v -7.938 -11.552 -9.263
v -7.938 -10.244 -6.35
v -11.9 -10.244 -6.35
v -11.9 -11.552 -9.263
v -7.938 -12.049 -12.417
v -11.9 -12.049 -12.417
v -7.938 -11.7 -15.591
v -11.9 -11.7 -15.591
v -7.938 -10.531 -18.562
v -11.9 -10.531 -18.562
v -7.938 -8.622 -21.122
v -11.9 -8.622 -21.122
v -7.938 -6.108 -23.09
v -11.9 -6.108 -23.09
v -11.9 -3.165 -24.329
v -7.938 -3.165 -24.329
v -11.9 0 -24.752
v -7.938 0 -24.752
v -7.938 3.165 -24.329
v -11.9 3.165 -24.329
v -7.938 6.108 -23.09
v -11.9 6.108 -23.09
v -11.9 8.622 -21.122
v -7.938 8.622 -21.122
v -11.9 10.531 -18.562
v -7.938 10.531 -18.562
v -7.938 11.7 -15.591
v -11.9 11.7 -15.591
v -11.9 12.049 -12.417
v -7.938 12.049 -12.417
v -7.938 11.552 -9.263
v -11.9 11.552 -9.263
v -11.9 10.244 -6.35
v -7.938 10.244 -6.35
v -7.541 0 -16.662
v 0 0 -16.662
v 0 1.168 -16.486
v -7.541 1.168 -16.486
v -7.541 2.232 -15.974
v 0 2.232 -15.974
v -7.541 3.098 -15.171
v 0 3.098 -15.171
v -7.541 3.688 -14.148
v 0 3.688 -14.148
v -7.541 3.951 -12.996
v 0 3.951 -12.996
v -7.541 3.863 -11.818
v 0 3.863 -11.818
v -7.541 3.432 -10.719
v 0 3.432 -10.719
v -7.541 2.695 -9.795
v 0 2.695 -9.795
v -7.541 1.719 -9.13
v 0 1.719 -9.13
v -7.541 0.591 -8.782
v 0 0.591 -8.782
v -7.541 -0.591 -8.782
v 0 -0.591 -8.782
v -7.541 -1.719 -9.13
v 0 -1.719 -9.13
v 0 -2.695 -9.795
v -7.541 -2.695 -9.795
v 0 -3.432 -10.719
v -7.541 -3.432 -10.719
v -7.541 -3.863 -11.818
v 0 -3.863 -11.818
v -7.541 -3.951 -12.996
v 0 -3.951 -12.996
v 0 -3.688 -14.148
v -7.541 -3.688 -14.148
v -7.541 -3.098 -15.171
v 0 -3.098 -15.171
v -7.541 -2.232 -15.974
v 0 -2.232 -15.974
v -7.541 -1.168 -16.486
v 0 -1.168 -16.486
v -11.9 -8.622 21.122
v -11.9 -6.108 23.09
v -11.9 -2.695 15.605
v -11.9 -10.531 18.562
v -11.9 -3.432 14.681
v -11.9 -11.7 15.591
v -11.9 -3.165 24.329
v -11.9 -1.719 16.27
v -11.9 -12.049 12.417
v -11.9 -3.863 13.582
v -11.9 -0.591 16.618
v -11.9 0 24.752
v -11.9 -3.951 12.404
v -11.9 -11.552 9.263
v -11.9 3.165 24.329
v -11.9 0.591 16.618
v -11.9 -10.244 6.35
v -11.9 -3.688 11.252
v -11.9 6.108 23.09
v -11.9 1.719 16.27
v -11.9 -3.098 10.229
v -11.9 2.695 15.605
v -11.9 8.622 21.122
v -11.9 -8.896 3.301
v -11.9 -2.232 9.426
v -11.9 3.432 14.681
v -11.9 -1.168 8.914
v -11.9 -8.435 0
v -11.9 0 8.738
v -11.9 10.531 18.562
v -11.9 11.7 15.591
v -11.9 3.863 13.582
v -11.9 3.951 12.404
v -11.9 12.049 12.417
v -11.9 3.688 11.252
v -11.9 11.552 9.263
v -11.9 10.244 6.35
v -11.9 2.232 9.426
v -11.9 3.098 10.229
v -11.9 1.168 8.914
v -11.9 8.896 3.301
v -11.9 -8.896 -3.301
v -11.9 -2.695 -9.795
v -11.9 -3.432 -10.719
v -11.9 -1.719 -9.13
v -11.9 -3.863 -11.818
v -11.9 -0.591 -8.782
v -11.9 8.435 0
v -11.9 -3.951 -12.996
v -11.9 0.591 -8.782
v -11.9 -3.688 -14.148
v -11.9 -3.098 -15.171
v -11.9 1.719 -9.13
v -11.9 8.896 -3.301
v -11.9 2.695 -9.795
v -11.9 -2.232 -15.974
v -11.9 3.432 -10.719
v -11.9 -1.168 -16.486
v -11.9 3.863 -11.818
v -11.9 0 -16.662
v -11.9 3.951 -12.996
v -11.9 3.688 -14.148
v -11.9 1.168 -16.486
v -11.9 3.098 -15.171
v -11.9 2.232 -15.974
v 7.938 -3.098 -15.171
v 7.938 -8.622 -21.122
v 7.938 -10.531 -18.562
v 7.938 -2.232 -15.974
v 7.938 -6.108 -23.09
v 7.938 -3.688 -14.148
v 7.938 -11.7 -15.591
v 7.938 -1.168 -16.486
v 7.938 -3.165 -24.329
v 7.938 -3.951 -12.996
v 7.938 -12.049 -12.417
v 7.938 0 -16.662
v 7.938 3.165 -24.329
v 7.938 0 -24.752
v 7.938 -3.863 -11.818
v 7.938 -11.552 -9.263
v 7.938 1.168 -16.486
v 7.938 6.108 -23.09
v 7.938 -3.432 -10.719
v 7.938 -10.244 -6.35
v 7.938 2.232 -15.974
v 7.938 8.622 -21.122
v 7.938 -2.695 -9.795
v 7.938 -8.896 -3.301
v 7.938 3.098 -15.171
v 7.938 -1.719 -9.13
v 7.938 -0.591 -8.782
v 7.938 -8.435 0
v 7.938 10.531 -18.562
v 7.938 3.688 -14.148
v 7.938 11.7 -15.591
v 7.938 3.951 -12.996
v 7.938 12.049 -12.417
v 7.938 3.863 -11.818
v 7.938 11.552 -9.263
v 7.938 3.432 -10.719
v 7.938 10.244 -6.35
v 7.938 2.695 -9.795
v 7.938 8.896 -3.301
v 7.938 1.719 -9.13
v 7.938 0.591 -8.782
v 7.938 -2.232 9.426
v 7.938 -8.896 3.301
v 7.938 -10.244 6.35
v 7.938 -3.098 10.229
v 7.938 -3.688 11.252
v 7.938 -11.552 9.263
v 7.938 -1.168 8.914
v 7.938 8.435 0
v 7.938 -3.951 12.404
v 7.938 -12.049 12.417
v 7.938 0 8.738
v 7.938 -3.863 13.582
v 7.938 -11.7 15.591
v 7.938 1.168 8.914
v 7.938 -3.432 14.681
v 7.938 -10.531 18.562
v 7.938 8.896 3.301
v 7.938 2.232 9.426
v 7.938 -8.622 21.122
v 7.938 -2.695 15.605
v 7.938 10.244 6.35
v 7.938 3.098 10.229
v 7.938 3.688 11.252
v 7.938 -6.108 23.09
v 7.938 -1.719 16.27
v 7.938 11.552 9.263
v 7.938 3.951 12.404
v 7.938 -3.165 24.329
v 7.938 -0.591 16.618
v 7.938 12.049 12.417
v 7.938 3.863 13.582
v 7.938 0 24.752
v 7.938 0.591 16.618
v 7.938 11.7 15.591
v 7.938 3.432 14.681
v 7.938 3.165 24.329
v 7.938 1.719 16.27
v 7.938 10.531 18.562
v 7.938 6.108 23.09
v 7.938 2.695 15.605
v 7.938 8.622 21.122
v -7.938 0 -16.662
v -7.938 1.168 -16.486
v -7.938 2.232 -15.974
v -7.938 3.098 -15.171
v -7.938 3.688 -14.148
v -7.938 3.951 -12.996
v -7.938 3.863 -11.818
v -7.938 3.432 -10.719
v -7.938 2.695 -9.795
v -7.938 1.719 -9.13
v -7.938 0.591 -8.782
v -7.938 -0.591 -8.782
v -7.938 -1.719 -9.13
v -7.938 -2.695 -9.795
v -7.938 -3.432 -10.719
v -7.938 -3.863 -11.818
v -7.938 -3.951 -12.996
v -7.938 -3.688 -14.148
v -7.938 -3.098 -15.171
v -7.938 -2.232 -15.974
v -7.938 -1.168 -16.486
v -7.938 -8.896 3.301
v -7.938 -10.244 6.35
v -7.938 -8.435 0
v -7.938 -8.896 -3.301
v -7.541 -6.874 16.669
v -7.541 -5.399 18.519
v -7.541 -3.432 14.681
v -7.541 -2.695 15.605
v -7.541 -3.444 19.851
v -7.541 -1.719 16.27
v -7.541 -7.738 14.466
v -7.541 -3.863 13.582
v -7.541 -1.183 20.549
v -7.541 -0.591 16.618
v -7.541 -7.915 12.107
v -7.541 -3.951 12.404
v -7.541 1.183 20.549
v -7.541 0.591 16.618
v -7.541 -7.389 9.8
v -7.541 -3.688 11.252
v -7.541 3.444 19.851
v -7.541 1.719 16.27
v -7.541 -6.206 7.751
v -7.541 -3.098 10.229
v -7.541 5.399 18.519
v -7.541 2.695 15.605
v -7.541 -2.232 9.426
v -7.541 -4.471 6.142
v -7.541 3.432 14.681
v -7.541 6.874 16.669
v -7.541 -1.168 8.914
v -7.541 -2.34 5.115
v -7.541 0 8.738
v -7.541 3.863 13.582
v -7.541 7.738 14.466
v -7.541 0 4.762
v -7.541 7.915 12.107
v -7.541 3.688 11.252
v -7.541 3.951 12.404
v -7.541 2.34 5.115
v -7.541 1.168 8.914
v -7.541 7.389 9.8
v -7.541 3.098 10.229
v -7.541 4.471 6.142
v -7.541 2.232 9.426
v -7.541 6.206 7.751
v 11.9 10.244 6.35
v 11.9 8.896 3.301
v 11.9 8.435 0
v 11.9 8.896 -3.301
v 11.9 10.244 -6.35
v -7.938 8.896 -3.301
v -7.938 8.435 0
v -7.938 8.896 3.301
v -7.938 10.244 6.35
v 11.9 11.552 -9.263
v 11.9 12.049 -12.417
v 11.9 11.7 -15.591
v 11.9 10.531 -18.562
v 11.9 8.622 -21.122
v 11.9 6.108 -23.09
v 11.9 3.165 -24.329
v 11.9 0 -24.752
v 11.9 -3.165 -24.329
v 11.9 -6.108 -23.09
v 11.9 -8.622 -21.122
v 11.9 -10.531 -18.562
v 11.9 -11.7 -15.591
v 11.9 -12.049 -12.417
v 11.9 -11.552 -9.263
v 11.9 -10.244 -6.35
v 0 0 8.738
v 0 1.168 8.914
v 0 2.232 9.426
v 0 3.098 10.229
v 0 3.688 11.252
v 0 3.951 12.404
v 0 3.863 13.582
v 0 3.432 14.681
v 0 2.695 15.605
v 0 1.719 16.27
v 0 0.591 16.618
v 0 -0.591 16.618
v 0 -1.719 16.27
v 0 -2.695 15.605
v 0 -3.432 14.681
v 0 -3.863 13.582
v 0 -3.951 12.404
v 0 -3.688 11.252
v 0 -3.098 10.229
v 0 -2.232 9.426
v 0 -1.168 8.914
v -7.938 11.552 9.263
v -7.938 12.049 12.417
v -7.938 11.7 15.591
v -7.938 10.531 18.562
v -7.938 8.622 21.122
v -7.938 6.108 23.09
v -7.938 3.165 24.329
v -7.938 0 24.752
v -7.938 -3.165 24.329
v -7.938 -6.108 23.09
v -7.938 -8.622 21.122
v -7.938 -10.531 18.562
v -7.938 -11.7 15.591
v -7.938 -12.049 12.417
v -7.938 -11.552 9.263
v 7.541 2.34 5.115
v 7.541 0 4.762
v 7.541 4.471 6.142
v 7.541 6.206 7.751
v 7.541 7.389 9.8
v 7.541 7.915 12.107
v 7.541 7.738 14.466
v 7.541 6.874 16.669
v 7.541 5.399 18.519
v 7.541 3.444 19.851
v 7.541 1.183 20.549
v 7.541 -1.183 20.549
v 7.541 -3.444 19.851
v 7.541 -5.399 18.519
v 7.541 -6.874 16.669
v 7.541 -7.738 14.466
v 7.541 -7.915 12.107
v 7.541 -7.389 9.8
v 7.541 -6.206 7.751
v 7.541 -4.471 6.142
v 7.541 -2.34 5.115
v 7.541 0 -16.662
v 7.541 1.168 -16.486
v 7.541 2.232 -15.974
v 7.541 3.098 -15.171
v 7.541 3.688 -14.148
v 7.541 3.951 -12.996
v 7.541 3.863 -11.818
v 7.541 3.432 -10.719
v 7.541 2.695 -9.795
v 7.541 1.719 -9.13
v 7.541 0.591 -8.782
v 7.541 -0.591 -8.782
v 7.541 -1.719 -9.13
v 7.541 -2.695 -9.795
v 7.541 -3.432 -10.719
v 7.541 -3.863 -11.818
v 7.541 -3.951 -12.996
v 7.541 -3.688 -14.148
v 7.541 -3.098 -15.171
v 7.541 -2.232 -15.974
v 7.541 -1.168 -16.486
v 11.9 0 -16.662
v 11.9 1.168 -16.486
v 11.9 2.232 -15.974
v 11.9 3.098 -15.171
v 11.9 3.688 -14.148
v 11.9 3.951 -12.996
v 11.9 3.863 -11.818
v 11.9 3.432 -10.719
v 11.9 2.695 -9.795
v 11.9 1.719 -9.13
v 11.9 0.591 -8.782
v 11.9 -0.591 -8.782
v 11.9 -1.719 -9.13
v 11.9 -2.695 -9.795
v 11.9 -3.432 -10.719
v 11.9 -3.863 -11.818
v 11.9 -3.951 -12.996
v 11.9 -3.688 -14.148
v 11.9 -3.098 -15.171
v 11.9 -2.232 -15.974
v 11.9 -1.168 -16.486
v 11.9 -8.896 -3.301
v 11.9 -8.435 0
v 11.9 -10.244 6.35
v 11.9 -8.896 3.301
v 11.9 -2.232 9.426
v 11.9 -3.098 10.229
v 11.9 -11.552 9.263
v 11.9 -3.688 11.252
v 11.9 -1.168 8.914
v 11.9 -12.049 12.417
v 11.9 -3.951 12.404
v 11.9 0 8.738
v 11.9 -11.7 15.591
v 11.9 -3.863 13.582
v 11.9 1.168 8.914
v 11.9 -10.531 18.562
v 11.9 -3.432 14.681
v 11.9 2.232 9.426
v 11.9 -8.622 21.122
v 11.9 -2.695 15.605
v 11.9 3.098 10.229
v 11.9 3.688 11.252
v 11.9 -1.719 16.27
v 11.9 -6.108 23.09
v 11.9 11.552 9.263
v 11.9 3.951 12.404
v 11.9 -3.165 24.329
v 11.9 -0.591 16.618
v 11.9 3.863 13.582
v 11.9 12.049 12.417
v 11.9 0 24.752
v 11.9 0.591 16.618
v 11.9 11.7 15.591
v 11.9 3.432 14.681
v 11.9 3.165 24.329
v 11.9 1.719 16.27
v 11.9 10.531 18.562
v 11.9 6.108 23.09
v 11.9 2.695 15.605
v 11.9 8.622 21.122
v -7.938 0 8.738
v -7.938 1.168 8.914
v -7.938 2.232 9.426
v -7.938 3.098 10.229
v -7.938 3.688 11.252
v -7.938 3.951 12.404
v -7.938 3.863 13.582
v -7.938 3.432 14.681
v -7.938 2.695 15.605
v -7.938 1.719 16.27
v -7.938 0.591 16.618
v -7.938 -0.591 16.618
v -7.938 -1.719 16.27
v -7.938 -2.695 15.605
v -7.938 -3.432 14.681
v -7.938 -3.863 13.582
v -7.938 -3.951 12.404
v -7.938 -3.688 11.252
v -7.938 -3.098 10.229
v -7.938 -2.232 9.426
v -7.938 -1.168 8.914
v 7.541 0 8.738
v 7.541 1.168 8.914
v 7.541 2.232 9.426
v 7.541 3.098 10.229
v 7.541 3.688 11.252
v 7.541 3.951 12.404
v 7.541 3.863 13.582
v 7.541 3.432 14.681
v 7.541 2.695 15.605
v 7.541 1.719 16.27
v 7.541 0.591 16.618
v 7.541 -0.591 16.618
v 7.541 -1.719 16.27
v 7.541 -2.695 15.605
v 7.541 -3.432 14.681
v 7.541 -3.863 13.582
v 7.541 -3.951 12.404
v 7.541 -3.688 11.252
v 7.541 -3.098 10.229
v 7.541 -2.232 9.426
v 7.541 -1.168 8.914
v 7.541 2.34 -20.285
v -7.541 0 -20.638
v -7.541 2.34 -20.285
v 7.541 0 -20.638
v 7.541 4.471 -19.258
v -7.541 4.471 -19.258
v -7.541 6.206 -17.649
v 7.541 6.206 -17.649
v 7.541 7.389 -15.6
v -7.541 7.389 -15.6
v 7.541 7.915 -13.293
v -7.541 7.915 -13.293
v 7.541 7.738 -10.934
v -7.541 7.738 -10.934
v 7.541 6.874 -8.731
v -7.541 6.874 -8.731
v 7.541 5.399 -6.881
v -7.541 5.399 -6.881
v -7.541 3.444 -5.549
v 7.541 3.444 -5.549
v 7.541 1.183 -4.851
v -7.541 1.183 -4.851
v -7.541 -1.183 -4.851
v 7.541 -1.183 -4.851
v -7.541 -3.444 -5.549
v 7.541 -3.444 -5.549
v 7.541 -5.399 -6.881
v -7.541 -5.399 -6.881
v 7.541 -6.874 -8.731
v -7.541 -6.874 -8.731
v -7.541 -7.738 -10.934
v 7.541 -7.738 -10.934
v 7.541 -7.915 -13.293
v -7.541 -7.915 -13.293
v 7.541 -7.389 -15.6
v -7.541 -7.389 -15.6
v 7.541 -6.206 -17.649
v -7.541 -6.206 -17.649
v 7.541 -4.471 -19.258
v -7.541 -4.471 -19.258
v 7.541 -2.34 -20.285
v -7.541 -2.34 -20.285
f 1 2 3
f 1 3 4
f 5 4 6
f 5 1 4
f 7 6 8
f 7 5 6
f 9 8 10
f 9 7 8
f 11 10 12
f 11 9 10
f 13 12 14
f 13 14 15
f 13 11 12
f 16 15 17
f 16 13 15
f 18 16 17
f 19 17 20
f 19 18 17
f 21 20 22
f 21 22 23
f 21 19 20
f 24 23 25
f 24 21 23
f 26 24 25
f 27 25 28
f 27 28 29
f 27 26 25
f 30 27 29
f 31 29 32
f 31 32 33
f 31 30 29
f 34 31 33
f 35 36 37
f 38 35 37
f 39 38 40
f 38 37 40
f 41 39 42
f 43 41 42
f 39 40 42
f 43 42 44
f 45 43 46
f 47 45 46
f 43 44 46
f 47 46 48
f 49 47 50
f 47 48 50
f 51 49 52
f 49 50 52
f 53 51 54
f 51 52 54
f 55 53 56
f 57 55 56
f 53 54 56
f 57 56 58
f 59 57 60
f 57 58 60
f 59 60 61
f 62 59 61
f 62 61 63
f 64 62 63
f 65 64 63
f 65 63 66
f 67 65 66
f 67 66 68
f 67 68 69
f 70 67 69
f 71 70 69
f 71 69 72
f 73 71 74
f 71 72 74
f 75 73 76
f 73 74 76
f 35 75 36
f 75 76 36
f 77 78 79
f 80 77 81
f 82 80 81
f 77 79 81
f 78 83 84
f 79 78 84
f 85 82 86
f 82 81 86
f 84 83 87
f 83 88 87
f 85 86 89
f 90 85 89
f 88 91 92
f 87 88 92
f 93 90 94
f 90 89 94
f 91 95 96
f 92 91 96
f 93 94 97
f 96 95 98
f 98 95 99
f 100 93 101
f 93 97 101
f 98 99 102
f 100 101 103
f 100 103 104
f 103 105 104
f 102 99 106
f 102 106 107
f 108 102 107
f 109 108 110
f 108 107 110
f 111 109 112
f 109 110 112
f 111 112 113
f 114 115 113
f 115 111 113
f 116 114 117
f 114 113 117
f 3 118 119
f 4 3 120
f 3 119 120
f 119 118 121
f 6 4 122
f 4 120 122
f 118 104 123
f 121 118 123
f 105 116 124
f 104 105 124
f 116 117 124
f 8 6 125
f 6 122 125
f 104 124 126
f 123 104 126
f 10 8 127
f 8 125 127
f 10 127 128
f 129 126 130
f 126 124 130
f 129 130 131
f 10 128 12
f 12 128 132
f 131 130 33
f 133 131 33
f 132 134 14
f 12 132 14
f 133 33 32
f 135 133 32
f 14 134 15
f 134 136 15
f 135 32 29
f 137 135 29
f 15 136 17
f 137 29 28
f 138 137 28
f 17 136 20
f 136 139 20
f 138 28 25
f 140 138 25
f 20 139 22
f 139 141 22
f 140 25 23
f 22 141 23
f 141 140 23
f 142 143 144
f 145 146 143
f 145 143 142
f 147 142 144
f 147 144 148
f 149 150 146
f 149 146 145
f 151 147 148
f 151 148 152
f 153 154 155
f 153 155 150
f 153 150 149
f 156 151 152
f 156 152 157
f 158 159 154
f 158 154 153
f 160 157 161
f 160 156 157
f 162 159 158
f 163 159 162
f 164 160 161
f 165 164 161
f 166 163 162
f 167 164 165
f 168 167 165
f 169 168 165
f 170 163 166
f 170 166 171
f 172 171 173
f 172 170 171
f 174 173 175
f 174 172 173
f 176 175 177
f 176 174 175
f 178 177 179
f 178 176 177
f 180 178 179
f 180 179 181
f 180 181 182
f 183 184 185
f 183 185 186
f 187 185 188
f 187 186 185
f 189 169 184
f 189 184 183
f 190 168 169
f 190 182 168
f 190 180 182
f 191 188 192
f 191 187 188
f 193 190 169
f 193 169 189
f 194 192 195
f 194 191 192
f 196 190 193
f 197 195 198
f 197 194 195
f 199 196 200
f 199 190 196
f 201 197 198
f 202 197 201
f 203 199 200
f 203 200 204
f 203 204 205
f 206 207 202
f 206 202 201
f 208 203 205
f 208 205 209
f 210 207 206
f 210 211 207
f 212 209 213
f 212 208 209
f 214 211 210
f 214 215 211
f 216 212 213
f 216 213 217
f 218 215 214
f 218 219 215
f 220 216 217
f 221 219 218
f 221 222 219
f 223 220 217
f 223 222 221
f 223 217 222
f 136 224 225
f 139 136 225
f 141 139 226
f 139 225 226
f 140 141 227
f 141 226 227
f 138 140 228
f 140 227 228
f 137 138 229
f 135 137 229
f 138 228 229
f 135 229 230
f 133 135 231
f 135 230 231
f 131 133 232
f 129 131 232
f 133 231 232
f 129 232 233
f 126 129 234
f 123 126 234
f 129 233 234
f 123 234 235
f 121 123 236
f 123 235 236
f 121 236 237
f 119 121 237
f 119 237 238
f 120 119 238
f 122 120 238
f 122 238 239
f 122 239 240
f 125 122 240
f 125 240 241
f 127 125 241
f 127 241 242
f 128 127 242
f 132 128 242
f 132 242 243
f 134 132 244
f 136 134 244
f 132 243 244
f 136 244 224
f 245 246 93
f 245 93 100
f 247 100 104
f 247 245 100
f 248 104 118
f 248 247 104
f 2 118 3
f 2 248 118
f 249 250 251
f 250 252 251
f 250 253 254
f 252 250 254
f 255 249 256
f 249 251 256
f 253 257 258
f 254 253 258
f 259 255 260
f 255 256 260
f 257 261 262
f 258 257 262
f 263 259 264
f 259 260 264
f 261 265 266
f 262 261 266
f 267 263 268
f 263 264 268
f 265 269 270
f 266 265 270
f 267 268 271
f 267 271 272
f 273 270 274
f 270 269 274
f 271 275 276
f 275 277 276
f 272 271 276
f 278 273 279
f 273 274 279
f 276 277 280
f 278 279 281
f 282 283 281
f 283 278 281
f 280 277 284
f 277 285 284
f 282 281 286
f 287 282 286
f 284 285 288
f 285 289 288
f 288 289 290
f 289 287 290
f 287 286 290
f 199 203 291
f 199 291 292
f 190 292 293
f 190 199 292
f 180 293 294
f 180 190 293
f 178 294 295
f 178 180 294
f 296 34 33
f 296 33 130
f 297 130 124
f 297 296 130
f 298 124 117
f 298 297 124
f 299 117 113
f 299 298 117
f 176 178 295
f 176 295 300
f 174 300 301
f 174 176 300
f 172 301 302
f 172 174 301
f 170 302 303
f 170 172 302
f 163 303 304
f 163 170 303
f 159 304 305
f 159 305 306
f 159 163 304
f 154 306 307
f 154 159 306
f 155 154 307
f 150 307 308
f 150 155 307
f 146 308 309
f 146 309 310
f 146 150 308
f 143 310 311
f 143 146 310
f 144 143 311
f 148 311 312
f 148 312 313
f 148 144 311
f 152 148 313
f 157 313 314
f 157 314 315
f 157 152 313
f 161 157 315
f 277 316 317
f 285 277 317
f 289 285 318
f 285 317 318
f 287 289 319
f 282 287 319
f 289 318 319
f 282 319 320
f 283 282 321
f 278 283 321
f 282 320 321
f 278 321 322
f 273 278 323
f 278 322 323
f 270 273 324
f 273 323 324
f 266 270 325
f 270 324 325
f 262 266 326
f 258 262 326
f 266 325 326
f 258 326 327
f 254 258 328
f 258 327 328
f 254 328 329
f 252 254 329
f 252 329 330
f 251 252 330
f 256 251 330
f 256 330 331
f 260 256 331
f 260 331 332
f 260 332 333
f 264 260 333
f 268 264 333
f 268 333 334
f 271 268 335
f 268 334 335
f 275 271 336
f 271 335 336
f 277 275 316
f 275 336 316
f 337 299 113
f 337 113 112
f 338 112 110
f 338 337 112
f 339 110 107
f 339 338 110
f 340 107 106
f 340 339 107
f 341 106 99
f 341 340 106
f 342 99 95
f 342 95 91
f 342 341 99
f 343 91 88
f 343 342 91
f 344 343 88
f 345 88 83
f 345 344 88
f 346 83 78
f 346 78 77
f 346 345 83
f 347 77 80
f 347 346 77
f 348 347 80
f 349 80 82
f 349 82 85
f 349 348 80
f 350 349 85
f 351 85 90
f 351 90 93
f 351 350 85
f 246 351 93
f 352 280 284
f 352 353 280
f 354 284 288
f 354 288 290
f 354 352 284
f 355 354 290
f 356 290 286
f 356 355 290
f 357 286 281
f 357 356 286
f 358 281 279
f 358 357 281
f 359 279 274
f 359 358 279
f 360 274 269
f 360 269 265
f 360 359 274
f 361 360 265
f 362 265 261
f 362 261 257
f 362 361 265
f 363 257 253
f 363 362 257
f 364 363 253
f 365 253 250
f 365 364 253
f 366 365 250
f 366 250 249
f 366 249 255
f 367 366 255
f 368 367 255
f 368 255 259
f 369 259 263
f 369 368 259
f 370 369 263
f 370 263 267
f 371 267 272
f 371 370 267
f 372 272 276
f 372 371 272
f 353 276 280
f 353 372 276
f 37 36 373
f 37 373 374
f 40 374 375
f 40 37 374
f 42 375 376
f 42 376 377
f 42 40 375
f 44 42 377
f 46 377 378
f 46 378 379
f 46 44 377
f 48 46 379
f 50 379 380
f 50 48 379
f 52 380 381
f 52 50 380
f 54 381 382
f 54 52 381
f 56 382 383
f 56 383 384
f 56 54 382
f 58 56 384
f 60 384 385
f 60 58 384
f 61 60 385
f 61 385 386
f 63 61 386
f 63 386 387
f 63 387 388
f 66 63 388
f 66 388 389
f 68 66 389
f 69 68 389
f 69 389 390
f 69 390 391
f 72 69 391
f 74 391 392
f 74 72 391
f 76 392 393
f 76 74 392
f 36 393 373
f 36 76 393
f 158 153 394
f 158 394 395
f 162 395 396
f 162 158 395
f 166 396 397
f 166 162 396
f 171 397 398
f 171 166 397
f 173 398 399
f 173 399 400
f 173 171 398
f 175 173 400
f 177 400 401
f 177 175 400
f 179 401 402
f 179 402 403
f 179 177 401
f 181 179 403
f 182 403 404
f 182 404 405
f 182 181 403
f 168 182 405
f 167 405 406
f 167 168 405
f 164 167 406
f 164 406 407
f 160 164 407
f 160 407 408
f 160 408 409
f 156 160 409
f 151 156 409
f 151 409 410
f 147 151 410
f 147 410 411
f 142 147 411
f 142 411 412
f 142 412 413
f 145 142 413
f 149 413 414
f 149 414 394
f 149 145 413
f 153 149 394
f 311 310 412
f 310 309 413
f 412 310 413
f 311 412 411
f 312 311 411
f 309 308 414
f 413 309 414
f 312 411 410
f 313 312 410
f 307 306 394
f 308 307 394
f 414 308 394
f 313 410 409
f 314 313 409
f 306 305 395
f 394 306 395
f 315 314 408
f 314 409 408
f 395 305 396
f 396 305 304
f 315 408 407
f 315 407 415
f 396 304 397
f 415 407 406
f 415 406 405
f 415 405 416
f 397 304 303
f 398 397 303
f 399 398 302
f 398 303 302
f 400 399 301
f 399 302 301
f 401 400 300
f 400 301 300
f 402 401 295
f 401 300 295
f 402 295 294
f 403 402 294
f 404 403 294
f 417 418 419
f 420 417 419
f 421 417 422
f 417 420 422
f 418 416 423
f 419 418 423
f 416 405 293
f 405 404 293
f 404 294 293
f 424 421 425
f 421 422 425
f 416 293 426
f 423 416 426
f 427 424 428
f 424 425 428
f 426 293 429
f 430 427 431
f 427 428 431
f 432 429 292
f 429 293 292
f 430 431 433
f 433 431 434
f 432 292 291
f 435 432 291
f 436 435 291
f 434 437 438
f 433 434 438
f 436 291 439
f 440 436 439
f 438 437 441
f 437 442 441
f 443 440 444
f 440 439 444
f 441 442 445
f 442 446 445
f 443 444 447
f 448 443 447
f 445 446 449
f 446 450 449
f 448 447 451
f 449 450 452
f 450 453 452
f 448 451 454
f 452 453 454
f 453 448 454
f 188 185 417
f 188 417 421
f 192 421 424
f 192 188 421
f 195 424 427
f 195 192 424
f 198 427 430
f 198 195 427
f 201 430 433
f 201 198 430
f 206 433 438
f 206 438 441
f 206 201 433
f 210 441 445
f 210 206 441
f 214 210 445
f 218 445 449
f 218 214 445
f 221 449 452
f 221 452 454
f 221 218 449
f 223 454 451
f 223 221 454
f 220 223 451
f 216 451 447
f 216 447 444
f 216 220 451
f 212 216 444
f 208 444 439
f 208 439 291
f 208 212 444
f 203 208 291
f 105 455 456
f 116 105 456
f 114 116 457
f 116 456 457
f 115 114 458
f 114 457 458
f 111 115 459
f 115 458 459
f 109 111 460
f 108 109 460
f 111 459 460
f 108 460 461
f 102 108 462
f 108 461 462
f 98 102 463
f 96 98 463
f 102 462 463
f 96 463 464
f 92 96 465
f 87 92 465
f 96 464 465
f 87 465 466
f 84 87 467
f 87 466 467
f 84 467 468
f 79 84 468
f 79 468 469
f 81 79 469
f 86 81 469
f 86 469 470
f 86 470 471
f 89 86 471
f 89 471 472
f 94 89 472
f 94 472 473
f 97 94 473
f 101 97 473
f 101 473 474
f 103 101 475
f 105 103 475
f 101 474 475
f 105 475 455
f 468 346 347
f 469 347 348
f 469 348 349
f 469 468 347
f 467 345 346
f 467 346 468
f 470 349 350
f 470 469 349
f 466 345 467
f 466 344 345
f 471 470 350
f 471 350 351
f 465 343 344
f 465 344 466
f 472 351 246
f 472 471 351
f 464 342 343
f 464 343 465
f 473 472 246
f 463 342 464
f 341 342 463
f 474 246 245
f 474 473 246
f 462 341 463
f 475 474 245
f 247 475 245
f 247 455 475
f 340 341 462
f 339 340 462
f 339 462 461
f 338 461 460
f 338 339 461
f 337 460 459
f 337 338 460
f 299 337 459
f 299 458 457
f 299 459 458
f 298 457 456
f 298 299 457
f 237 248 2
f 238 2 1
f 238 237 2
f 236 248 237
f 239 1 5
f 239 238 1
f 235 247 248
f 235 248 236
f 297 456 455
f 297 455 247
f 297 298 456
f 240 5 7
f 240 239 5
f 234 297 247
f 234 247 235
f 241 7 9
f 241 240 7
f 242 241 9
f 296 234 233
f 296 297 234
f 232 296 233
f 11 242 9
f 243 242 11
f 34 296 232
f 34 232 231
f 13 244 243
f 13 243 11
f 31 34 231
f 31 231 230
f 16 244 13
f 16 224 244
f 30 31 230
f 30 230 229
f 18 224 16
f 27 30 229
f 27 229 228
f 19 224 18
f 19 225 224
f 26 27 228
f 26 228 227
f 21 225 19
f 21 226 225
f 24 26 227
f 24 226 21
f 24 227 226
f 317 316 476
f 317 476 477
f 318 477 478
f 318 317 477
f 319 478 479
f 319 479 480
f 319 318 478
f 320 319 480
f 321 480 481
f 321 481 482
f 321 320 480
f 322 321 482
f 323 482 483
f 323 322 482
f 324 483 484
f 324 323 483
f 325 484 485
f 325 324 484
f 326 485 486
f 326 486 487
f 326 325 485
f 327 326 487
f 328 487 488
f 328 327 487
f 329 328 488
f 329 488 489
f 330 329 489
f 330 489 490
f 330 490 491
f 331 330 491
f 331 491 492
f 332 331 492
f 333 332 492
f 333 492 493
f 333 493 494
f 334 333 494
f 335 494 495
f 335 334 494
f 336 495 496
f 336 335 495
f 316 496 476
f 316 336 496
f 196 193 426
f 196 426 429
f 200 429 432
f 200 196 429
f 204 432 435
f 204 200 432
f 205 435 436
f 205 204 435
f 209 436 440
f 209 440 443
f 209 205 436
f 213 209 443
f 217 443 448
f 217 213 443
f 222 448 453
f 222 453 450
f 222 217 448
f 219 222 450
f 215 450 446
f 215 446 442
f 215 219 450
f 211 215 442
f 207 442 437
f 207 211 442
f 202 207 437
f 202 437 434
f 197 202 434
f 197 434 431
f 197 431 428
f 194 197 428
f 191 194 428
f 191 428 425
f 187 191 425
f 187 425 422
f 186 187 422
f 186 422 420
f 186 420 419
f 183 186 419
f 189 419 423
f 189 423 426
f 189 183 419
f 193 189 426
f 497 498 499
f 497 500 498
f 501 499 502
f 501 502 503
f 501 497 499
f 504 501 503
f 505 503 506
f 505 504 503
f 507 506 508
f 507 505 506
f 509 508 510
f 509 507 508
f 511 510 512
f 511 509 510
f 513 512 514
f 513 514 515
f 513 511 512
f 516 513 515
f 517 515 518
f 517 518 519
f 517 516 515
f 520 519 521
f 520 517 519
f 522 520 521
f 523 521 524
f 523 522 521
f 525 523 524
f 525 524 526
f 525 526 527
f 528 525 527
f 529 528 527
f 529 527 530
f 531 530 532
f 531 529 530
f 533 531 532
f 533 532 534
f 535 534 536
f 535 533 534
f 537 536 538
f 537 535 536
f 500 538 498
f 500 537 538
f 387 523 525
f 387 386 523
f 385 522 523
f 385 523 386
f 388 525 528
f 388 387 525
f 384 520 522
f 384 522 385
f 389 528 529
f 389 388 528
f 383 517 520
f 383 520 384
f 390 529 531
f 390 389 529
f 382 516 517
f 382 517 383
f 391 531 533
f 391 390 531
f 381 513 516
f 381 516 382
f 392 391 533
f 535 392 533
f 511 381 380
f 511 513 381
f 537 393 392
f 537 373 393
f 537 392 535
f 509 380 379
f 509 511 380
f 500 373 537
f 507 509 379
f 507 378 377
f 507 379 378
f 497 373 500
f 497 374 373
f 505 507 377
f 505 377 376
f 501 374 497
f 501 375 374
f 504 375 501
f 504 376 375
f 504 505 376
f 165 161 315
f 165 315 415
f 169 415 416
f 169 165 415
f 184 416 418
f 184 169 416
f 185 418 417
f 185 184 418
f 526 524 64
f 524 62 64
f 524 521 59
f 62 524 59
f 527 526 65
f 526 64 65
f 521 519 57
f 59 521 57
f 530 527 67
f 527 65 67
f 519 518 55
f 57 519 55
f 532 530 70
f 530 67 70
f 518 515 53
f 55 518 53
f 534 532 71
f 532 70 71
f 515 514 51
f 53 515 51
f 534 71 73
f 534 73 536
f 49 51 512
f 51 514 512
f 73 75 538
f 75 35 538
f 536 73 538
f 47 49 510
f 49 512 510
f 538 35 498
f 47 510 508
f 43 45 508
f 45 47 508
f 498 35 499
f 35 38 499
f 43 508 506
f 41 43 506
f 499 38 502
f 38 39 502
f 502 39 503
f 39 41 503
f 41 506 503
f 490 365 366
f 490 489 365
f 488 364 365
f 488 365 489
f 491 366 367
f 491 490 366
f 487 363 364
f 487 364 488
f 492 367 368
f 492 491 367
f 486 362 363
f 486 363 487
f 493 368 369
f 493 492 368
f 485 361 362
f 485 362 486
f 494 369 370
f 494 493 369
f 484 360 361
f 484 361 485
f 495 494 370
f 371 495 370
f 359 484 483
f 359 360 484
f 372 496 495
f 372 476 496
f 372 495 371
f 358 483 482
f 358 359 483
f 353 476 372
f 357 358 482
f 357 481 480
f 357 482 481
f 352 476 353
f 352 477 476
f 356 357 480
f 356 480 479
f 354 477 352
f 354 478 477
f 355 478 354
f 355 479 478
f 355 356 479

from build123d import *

# Parameters (mm, degrees)
BACK_LINK_SKETCH_R          = 3.9624
BACK_LINK_EXTRUDE_DEPTH     = 3.9624
FRONT_LINK_SKETCH_R         = 3.9624
FRONT_LINK_EXTRUDE_DEPTH    = 3.9624
ROLLER_SKETCH_R             = 7.9375
ROLLER_SKETCH_R_2           = 3.9624
ROLLER_EXTRUDE_DEPTH        = 7.540625
ROLLER_EXTRUDE_DEPTH_BACK   = 7.540625
ROLLER_EXTRUDE_2_DEPTH      = 7.540625
ROLLER_EXTRUDE_2_DEPTH_BACK = 7.540625


with BuildPart() as part:
    # Back Link Sketch → Back Link Extrude (new body)
    with BuildSketch(Plane(origin=(-7.9375, 0, 0), x_dir=(0, 0, -1), z_dir=(1, 0, 0))):
        with BuildLine():
            ThreePointArc((-6.35, 10.243799846), (-24.7523, 0), (-6.35, -10.243799846))
            ThreePointArc((-6.35, -10.243799846), (0, -8.435299692), (6.35, -10.243799846))
            ThreePointArc((6.35, -10.243799846), (24.7523, 0), (6.35, 10.243799846))
            ThreePointArc((6.35, 10.243799846), (0, 8.435299692), (-6.35, 10.243799846))
        make_face()
        with Locations((-12.7, 0)):
            Circle(BACK_LINK_SKETCH_R, mode=Mode.SUBTRACT)
        with Locations((12.7, 0)):
            Circle(BACK_LINK_SKETCH_R, mode=Mode.SUBTRACT)
    extrude(amount=-BACK_LINK_EXTRUDE_DEPTH)


with BuildPart() as body_2:
    # Front Link Sketch → Front Link Extrude (new body)
    with BuildSketch(Plane(origin=(7.9375, 0, 0), x_dir=(0, 0, -1), z_dir=(1, 0, 0))):
        with BuildLine():
            ThreePointArc((-6.35, 10.243799846), (0, 8.435299692), (6.35, 10.243799846))
            ThreePointArc((6.35, 10.243799846), (24.7523, 0), (6.35, -10.243799846))
            ThreePointArc((6.35, -10.243799846), (0, -8.435299692), (-6.35, -10.243799846))
            ThreePointArc((-6.35, -10.243799846), (-24.7523, 0), (-6.35, 10.243799846))
        make_face()
        with Locations((-12.7, 0)):
            Circle(FRONT_LINK_SKETCH_R, mode=Mode.SUBTRACT)
        with Locations((12.7, 0)):
            Circle(FRONT_LINK_SKETCH_R, mode=Mode.SUBTRACT)
    extrude(amount=FRONT_LINK_EXTRUDE_DEPTH)


with BuildPart() as body_3:
    # Roller Sketch → Roller Extrude (new body, two sides)
    with BuildSketch(Plane(origin=(0, 0, 0), x_dir=(0, 0, -1), z_dir=(1, 0, 0))) as roller_extrude_sk:
        with Locations((12.7, 0)):
            Circle(ROLLER_SKETCH_R)
        with Locations((12.7, 0)):
            Circle(ROLLER_SKETCH_R_2, mode=Mode.SUBTRACT)
    extrude(amount=ROLLER_EXTRUDE_DEPTH)
    extrude(roller_extrude_sk.sketch, amount=-ROLLER_EXTRUDE_DEPTH_BACK)


with BuildPart() as body_4:
    # Roller Sketch → Roller Extrude 2 (new body, two sides)
    with BuildSketch(Plane(origin=(0, 0, 0), x_dir=(0, 0, -1), z_dir=(1, 0, 0))) as roller_extrude_2_sk:
        with Locations((-12.7, 0)):
            Circle(ROLLER_SKETCH_R)
        with Locations((-12.7, 0)):
            Circle(ROLLER_SKETCH_R_2, mode=Mode.SUBTRACT)
    extrude(amount=ROLLER_EXTRUDE_2_DEPTH)
    extrude(roller_extrude_2_sk.sketch, amount=-ROLLER_EXTRUDE_2_DEPTH_BACK)


solid = Compound([part.part, body_2.part, body_3.part, body_4.part])
